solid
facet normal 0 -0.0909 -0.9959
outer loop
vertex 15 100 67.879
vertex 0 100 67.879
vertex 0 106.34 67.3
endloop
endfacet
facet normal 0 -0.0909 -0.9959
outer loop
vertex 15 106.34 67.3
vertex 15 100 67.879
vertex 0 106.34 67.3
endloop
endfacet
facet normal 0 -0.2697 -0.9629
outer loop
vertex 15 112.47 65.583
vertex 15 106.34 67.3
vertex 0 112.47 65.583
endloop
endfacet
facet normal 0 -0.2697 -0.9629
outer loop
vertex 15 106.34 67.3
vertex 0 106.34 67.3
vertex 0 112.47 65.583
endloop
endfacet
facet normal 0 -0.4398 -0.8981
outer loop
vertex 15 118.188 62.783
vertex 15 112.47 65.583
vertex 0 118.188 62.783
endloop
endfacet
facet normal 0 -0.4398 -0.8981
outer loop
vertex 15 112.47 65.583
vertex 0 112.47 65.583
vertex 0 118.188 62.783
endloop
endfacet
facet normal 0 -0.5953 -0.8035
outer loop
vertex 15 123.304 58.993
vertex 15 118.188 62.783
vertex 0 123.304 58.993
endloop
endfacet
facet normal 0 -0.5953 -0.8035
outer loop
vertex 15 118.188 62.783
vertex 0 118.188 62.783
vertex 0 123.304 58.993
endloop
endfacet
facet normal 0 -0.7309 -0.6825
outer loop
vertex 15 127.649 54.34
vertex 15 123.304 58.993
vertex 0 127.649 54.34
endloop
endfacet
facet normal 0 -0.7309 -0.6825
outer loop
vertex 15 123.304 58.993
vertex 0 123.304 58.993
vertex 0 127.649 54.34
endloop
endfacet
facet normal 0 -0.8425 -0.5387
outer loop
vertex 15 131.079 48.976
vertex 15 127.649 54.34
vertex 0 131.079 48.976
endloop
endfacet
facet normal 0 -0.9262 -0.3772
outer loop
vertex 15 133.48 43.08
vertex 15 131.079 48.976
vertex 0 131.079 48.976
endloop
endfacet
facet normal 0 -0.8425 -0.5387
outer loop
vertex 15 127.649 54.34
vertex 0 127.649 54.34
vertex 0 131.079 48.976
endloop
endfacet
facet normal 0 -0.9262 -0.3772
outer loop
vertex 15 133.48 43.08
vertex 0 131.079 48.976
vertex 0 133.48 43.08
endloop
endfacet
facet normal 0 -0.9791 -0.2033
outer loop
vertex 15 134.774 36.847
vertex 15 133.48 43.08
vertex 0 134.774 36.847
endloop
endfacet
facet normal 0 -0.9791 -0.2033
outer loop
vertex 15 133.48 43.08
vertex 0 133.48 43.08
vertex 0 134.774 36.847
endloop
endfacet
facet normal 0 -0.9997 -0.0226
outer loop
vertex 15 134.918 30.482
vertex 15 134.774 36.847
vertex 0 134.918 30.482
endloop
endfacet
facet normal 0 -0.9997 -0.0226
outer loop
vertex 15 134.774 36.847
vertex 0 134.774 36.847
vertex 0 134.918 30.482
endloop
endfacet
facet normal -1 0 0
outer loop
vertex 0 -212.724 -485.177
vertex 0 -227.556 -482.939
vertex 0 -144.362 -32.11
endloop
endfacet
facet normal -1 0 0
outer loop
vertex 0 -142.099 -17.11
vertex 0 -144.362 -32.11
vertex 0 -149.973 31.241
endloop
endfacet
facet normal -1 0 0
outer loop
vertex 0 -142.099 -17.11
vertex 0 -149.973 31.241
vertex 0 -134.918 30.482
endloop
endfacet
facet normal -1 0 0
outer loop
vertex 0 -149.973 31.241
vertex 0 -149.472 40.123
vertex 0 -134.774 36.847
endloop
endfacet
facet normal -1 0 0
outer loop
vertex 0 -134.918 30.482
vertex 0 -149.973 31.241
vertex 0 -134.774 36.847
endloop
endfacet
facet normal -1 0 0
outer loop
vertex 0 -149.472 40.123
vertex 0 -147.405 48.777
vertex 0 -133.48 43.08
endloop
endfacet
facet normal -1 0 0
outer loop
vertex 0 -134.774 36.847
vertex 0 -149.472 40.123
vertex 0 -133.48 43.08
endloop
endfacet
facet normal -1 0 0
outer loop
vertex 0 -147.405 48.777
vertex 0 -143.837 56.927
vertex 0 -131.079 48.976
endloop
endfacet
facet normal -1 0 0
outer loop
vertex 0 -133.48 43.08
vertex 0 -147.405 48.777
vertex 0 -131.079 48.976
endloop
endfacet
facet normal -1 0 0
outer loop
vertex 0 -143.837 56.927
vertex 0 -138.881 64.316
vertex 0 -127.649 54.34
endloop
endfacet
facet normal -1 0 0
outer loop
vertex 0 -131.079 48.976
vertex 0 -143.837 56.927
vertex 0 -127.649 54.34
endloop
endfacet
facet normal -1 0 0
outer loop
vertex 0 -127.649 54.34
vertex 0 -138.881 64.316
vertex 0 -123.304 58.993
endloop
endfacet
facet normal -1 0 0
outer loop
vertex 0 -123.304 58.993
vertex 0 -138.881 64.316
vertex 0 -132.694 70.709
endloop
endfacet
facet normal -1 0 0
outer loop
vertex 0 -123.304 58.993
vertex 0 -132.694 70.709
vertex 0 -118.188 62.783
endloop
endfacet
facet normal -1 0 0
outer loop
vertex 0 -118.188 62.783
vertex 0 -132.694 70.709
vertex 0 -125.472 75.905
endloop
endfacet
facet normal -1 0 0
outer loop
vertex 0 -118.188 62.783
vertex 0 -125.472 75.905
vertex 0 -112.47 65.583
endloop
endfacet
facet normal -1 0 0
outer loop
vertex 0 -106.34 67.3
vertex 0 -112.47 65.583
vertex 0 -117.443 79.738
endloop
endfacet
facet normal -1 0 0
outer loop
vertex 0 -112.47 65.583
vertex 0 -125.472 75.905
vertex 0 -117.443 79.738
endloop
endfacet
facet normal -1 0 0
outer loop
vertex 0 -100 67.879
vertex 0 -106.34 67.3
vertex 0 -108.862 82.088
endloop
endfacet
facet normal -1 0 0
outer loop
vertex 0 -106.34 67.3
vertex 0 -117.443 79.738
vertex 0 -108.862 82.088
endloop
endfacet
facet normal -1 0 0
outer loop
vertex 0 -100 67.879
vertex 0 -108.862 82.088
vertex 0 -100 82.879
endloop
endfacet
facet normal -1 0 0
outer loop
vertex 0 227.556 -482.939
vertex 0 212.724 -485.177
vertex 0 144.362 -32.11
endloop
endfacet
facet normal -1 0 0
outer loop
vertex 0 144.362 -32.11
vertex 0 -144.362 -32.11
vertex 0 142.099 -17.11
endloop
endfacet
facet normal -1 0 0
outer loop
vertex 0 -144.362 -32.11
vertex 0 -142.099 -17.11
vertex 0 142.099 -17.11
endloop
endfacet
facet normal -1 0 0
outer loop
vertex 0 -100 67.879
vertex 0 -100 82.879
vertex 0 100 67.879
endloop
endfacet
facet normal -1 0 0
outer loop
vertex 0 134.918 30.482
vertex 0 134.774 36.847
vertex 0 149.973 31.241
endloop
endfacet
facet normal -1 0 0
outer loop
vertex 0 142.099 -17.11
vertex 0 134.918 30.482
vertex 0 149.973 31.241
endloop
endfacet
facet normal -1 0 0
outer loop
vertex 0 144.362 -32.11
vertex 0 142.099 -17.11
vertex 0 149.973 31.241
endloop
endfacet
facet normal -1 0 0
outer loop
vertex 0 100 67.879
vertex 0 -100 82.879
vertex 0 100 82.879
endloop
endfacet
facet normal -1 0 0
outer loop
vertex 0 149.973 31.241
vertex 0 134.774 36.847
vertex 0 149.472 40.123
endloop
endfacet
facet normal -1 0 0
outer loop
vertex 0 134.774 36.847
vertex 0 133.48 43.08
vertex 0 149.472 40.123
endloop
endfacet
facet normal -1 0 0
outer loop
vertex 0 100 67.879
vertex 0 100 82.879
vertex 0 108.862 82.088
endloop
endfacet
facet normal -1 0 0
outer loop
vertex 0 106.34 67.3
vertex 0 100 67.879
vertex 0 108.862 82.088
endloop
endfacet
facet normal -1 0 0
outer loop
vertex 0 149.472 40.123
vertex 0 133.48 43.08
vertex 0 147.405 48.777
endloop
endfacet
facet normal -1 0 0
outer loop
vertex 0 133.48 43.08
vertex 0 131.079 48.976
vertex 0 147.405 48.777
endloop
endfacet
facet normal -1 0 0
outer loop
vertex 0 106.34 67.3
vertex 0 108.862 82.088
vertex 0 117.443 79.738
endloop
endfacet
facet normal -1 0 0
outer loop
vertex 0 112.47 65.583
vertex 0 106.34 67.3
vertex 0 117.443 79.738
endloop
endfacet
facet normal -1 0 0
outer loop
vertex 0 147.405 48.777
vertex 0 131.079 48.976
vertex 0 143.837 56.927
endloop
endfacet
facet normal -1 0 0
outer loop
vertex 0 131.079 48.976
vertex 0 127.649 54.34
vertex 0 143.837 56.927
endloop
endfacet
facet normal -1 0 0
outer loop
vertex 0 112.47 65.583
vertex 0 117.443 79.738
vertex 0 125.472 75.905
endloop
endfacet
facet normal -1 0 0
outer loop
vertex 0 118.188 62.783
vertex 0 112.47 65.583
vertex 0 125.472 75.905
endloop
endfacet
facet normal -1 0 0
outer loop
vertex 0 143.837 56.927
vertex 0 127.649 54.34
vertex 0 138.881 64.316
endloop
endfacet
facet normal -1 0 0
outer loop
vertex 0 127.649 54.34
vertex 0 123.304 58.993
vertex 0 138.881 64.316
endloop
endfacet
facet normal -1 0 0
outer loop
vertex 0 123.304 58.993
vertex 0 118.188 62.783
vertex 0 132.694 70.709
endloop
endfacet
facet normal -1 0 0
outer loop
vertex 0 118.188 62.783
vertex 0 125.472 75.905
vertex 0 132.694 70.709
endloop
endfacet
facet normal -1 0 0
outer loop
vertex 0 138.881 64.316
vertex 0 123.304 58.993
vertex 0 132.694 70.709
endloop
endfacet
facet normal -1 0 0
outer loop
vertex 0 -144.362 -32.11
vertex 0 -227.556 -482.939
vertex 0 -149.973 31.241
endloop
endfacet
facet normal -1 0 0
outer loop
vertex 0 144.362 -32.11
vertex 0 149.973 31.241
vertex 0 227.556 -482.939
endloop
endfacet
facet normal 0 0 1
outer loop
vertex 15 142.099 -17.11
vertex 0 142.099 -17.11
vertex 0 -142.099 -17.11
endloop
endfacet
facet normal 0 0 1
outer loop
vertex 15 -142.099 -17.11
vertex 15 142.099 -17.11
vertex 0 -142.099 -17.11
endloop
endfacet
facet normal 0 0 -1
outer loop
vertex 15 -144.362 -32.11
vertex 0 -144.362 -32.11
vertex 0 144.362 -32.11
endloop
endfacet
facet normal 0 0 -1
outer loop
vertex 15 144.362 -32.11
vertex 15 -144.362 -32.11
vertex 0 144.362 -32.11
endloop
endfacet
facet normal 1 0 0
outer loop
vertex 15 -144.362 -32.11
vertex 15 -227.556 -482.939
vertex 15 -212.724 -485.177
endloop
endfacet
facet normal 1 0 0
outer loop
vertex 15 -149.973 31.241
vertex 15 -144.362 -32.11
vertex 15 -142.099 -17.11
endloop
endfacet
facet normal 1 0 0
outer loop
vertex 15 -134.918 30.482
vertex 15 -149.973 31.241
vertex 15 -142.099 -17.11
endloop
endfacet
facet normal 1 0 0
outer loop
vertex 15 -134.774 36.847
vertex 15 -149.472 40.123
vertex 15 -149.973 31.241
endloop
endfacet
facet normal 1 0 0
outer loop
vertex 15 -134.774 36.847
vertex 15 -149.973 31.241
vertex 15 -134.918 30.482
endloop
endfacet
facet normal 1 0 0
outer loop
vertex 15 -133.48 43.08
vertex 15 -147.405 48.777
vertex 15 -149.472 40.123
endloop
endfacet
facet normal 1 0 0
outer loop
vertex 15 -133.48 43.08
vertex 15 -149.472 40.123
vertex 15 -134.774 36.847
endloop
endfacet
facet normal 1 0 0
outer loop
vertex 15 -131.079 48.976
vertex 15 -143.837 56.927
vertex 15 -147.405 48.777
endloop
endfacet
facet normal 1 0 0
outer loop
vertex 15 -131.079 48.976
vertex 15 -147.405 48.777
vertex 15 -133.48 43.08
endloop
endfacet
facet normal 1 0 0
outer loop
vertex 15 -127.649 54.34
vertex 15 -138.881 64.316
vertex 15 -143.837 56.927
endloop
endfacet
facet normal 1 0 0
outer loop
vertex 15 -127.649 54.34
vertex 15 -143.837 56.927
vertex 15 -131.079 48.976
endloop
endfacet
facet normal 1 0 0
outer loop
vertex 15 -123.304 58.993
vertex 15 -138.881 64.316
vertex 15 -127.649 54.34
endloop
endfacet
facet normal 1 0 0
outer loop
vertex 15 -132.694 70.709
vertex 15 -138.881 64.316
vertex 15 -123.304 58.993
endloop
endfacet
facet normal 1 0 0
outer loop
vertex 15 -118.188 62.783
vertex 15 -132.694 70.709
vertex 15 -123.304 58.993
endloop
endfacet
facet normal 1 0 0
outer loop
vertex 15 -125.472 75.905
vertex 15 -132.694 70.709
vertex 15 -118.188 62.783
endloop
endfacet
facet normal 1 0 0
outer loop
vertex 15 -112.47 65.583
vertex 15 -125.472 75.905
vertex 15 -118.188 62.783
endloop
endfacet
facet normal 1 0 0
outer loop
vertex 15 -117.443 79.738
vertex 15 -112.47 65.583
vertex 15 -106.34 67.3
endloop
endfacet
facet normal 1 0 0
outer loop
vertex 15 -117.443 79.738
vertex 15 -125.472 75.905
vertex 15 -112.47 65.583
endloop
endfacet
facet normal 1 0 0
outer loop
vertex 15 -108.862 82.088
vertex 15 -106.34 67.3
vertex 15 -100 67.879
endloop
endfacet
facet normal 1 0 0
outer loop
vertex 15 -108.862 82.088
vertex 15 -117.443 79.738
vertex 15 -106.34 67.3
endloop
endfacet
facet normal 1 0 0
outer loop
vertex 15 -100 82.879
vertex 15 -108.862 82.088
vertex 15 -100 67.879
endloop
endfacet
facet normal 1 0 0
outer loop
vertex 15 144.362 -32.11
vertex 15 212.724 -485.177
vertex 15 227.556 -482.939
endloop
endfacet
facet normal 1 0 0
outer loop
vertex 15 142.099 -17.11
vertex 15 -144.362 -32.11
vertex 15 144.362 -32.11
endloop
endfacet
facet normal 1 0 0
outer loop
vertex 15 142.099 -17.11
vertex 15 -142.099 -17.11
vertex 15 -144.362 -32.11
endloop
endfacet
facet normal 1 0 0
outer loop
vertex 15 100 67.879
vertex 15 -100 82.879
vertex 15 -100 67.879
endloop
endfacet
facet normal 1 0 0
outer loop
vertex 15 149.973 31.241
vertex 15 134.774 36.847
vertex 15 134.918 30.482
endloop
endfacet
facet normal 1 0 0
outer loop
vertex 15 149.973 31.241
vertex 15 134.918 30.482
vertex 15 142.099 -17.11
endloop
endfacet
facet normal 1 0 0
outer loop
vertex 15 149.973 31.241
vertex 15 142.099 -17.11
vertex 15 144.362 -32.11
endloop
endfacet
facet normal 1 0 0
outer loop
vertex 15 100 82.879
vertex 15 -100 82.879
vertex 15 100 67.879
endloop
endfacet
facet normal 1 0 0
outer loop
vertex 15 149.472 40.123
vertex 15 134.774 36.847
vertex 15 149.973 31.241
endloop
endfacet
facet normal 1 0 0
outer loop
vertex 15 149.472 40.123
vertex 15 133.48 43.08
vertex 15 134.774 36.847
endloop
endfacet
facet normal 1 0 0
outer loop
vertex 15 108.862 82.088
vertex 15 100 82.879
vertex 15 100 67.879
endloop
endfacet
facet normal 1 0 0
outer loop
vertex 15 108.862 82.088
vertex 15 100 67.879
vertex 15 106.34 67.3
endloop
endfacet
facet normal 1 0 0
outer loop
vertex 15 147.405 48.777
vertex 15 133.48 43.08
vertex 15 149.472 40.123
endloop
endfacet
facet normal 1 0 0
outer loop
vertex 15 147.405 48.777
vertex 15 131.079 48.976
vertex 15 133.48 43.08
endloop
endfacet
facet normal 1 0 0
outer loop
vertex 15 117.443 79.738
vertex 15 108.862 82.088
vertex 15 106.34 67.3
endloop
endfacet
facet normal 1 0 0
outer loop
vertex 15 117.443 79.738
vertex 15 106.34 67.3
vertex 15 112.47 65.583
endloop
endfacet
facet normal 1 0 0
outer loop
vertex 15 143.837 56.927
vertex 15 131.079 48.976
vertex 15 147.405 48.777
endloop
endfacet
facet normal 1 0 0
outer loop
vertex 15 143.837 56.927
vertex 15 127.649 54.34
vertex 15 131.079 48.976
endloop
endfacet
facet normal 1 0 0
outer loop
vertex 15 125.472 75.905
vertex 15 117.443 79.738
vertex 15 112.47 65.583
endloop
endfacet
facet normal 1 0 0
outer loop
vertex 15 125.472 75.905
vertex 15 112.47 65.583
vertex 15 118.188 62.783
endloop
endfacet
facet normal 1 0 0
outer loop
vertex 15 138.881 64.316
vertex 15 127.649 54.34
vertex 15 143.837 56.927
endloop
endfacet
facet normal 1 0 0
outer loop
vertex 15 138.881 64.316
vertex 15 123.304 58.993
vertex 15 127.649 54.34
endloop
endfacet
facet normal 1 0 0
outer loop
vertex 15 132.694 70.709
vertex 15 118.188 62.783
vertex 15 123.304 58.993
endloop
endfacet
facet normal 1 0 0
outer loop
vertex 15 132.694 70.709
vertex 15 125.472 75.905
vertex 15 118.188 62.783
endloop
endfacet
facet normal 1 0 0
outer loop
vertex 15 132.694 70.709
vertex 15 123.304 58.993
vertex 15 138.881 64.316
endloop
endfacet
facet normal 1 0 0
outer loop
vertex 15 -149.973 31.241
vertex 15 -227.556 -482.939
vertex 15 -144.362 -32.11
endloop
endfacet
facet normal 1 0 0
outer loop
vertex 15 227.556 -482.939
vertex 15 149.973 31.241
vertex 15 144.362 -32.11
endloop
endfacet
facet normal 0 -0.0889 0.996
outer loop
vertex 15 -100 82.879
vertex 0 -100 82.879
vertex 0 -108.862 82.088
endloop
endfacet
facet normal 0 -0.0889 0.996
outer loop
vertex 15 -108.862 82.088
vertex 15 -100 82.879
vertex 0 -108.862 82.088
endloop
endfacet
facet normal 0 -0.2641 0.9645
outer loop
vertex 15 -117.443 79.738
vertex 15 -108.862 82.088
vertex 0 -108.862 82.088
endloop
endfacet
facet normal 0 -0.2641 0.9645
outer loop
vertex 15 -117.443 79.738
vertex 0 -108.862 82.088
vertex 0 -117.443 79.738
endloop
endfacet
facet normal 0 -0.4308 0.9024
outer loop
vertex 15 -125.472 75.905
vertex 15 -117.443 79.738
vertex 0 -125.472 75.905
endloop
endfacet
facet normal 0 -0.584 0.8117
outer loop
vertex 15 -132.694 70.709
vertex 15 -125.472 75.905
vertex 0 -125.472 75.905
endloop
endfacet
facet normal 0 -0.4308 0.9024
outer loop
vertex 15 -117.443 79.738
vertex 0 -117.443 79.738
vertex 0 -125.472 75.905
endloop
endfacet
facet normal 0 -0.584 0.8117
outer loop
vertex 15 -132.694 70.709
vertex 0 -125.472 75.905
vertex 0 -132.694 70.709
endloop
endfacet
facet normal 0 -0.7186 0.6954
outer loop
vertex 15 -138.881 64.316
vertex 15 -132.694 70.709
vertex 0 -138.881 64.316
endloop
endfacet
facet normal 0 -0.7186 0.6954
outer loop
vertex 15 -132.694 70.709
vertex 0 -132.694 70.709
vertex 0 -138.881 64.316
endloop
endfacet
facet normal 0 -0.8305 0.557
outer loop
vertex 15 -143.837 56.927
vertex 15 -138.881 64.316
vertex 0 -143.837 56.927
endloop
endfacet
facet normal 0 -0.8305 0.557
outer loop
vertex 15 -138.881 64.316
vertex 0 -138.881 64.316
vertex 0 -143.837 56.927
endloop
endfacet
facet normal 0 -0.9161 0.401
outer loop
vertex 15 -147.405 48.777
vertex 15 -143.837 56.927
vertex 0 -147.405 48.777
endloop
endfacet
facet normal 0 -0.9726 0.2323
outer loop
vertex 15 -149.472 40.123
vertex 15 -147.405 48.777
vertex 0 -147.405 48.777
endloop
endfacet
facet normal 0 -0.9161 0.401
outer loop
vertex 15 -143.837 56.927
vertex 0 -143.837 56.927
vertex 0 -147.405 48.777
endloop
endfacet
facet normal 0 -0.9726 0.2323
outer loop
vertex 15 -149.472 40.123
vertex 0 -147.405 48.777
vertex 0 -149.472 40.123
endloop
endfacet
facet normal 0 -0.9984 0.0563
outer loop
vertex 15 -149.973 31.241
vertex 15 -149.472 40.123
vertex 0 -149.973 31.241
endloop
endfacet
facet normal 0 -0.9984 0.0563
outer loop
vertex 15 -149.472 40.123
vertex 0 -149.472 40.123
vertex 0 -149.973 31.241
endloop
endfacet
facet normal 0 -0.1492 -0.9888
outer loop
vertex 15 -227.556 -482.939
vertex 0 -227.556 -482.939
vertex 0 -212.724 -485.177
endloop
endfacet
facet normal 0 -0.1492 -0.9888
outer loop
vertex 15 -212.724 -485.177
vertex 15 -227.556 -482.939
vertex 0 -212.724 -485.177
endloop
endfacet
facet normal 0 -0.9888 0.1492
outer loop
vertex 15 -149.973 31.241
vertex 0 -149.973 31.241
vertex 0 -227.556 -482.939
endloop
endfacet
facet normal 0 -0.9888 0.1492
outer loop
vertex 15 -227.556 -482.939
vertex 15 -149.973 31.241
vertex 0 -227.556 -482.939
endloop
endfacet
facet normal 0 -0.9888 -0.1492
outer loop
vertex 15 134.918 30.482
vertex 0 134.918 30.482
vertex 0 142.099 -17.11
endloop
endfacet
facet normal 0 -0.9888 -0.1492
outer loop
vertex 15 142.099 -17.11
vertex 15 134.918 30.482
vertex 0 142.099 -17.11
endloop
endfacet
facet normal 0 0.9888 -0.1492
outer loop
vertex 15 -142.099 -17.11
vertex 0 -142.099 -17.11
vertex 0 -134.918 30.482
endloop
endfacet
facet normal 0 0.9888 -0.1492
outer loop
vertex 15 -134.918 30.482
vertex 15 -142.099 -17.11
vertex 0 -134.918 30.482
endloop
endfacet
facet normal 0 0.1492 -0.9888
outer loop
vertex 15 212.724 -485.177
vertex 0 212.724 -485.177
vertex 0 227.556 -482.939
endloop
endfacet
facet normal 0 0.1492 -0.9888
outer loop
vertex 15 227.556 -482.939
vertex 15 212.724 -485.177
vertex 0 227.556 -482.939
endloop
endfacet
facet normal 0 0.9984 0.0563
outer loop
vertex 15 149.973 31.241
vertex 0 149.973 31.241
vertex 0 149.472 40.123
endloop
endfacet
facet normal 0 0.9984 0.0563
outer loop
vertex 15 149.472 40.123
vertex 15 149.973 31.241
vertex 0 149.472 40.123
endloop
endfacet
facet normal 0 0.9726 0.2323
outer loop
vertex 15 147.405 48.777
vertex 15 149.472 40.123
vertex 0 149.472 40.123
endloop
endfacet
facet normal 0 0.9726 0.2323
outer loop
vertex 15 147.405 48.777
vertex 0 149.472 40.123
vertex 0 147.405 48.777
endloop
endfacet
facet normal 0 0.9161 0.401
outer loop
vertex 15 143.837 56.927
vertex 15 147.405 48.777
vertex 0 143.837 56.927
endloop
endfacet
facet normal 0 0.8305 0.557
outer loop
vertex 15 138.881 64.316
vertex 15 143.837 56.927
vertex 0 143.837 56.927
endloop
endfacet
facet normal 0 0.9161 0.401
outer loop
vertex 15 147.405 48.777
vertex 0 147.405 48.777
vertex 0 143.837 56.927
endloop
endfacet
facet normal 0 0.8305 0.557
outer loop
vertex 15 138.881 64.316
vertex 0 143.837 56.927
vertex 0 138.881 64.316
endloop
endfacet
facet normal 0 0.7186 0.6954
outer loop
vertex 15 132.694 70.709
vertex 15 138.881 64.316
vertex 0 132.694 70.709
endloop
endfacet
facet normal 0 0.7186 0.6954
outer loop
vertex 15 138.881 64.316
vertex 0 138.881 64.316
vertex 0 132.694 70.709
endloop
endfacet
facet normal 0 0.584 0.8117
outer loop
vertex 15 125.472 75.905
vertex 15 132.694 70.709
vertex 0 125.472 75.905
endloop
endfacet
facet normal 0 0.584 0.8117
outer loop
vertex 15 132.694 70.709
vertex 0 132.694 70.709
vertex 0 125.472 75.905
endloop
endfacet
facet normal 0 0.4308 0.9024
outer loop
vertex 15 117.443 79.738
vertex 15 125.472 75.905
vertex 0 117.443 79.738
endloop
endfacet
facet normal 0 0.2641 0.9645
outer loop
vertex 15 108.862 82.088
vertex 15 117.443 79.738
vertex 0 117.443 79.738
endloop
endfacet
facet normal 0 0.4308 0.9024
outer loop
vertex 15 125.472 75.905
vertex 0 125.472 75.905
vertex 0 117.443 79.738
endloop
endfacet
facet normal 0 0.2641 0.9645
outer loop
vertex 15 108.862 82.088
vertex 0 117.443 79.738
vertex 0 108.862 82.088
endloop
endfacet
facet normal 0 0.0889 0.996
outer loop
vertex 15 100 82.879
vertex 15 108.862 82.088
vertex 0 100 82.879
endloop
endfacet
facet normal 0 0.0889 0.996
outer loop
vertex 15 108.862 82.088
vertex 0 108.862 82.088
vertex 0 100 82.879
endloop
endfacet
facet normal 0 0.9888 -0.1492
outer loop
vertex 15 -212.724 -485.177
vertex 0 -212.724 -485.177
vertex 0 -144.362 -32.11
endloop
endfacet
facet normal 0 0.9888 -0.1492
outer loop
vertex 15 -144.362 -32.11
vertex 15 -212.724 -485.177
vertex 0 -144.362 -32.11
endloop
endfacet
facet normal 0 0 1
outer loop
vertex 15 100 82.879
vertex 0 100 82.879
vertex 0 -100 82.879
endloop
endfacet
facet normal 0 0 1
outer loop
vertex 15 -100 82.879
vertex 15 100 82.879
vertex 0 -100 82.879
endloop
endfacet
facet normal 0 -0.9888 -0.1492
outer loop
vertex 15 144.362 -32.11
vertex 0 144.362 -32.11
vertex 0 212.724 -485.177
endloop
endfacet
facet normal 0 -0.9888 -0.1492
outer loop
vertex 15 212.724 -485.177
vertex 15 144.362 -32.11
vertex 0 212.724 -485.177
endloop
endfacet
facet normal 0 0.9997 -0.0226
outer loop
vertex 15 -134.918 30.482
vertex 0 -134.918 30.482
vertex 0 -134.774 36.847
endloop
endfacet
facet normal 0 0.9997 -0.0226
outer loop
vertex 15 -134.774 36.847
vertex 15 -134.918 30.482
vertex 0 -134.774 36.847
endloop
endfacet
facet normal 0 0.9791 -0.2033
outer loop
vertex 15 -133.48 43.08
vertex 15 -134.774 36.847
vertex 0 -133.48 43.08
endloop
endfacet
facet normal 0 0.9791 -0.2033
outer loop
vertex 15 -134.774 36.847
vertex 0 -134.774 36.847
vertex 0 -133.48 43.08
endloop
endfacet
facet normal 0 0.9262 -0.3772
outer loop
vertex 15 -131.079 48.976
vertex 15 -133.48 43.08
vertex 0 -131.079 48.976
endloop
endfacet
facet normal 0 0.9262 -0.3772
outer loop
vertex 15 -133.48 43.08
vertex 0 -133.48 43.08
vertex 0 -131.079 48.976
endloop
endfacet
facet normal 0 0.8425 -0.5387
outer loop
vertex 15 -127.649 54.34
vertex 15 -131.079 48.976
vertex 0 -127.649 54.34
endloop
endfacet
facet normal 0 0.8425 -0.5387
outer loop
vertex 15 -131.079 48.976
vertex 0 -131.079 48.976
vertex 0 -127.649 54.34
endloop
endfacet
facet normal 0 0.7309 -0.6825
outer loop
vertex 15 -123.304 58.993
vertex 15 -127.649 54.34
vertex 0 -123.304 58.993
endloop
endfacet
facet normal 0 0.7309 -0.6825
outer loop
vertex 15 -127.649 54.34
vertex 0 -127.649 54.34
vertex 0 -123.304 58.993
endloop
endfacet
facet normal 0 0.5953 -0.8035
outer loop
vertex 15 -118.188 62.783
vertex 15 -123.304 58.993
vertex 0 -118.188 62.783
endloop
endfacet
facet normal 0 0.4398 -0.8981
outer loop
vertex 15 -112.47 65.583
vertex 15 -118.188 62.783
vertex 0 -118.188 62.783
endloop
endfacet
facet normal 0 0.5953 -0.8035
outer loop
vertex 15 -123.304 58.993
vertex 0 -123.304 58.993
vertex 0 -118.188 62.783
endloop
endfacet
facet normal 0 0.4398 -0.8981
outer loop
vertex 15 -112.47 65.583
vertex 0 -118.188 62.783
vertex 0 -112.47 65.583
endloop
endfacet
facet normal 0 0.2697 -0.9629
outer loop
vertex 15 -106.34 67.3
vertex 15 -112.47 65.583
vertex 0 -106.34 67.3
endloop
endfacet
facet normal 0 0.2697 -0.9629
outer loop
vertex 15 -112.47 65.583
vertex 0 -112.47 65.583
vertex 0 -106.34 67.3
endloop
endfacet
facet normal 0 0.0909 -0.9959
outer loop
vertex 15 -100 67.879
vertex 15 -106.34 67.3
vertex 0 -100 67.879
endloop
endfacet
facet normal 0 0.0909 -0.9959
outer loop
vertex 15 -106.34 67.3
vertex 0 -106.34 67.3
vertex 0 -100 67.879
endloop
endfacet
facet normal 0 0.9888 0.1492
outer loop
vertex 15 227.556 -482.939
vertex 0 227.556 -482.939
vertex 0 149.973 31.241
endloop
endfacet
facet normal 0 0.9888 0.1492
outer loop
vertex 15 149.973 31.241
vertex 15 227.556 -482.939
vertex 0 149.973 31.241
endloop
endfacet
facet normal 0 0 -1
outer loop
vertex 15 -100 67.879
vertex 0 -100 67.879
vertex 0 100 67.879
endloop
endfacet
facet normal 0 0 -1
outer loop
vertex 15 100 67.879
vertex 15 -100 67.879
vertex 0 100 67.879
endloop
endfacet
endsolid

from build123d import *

# Parameters (mm, degrees)
F1_DEPTH = 15


with BuildPart() as f1:
    # F0 (on Right) → F1 (new body)
    with BuildSketch(Plane.YZ):
        with BuildLine():
            ThreePointArc((-100, 82.879485), (-135.930106, 67.650557), (-149.973133, 31.240583))
            Line((-149.973133, 31.240583), (-227.556466, -482.939178))
            Line((-227.556466, -482.939178), (-212.724353, -485.177159))
            Line((-212.724353, -485.177159), (-144.362209, -32.110378))
            Line((-144.362209, -32.110378), (144.362209, -32.110378))
            Line((144.362209, -32.110378), (212.724353, -485.177159))
            Line((212.724353, -485.177159), (227.556466, -482.939178))
            Line((227.556466, -482.939178), (149.973133, 31.240583))
            ThreePointArc((149.973133, 31.240583), (135.930106, 67.650557), (100, 82.879485))
            Line((100, 82.879485), (0, 82.879485))
            Line((0, 82.879485), (-100, 82.879485))
        make_face()
        with BuildLine():
            Line((-142.098895, -17.110378), (-134.91779, 30.482052))
            ThreePointArc((-134.91779, 30.482052), (-125.582317, 56.765564), (-100, 67.879481))
            Line((-100, 67.879481), (0, 67.879481))
            Line((0, 67.879481), (100, 67.879481))
            ThreePointArc((100, 67.879481), (125.582317, 56.765564), (134.91779, 30.482052))
            Line((134.91779, 30.482052), (142.098895, -17.110378))
            Line((142.098895, -17.110378), (-142.098895, -17.110378))
        make_face(mode=Mode.SUBTRACT)
    extrude(amount=F1_DEPTH)


solid = f1.part
